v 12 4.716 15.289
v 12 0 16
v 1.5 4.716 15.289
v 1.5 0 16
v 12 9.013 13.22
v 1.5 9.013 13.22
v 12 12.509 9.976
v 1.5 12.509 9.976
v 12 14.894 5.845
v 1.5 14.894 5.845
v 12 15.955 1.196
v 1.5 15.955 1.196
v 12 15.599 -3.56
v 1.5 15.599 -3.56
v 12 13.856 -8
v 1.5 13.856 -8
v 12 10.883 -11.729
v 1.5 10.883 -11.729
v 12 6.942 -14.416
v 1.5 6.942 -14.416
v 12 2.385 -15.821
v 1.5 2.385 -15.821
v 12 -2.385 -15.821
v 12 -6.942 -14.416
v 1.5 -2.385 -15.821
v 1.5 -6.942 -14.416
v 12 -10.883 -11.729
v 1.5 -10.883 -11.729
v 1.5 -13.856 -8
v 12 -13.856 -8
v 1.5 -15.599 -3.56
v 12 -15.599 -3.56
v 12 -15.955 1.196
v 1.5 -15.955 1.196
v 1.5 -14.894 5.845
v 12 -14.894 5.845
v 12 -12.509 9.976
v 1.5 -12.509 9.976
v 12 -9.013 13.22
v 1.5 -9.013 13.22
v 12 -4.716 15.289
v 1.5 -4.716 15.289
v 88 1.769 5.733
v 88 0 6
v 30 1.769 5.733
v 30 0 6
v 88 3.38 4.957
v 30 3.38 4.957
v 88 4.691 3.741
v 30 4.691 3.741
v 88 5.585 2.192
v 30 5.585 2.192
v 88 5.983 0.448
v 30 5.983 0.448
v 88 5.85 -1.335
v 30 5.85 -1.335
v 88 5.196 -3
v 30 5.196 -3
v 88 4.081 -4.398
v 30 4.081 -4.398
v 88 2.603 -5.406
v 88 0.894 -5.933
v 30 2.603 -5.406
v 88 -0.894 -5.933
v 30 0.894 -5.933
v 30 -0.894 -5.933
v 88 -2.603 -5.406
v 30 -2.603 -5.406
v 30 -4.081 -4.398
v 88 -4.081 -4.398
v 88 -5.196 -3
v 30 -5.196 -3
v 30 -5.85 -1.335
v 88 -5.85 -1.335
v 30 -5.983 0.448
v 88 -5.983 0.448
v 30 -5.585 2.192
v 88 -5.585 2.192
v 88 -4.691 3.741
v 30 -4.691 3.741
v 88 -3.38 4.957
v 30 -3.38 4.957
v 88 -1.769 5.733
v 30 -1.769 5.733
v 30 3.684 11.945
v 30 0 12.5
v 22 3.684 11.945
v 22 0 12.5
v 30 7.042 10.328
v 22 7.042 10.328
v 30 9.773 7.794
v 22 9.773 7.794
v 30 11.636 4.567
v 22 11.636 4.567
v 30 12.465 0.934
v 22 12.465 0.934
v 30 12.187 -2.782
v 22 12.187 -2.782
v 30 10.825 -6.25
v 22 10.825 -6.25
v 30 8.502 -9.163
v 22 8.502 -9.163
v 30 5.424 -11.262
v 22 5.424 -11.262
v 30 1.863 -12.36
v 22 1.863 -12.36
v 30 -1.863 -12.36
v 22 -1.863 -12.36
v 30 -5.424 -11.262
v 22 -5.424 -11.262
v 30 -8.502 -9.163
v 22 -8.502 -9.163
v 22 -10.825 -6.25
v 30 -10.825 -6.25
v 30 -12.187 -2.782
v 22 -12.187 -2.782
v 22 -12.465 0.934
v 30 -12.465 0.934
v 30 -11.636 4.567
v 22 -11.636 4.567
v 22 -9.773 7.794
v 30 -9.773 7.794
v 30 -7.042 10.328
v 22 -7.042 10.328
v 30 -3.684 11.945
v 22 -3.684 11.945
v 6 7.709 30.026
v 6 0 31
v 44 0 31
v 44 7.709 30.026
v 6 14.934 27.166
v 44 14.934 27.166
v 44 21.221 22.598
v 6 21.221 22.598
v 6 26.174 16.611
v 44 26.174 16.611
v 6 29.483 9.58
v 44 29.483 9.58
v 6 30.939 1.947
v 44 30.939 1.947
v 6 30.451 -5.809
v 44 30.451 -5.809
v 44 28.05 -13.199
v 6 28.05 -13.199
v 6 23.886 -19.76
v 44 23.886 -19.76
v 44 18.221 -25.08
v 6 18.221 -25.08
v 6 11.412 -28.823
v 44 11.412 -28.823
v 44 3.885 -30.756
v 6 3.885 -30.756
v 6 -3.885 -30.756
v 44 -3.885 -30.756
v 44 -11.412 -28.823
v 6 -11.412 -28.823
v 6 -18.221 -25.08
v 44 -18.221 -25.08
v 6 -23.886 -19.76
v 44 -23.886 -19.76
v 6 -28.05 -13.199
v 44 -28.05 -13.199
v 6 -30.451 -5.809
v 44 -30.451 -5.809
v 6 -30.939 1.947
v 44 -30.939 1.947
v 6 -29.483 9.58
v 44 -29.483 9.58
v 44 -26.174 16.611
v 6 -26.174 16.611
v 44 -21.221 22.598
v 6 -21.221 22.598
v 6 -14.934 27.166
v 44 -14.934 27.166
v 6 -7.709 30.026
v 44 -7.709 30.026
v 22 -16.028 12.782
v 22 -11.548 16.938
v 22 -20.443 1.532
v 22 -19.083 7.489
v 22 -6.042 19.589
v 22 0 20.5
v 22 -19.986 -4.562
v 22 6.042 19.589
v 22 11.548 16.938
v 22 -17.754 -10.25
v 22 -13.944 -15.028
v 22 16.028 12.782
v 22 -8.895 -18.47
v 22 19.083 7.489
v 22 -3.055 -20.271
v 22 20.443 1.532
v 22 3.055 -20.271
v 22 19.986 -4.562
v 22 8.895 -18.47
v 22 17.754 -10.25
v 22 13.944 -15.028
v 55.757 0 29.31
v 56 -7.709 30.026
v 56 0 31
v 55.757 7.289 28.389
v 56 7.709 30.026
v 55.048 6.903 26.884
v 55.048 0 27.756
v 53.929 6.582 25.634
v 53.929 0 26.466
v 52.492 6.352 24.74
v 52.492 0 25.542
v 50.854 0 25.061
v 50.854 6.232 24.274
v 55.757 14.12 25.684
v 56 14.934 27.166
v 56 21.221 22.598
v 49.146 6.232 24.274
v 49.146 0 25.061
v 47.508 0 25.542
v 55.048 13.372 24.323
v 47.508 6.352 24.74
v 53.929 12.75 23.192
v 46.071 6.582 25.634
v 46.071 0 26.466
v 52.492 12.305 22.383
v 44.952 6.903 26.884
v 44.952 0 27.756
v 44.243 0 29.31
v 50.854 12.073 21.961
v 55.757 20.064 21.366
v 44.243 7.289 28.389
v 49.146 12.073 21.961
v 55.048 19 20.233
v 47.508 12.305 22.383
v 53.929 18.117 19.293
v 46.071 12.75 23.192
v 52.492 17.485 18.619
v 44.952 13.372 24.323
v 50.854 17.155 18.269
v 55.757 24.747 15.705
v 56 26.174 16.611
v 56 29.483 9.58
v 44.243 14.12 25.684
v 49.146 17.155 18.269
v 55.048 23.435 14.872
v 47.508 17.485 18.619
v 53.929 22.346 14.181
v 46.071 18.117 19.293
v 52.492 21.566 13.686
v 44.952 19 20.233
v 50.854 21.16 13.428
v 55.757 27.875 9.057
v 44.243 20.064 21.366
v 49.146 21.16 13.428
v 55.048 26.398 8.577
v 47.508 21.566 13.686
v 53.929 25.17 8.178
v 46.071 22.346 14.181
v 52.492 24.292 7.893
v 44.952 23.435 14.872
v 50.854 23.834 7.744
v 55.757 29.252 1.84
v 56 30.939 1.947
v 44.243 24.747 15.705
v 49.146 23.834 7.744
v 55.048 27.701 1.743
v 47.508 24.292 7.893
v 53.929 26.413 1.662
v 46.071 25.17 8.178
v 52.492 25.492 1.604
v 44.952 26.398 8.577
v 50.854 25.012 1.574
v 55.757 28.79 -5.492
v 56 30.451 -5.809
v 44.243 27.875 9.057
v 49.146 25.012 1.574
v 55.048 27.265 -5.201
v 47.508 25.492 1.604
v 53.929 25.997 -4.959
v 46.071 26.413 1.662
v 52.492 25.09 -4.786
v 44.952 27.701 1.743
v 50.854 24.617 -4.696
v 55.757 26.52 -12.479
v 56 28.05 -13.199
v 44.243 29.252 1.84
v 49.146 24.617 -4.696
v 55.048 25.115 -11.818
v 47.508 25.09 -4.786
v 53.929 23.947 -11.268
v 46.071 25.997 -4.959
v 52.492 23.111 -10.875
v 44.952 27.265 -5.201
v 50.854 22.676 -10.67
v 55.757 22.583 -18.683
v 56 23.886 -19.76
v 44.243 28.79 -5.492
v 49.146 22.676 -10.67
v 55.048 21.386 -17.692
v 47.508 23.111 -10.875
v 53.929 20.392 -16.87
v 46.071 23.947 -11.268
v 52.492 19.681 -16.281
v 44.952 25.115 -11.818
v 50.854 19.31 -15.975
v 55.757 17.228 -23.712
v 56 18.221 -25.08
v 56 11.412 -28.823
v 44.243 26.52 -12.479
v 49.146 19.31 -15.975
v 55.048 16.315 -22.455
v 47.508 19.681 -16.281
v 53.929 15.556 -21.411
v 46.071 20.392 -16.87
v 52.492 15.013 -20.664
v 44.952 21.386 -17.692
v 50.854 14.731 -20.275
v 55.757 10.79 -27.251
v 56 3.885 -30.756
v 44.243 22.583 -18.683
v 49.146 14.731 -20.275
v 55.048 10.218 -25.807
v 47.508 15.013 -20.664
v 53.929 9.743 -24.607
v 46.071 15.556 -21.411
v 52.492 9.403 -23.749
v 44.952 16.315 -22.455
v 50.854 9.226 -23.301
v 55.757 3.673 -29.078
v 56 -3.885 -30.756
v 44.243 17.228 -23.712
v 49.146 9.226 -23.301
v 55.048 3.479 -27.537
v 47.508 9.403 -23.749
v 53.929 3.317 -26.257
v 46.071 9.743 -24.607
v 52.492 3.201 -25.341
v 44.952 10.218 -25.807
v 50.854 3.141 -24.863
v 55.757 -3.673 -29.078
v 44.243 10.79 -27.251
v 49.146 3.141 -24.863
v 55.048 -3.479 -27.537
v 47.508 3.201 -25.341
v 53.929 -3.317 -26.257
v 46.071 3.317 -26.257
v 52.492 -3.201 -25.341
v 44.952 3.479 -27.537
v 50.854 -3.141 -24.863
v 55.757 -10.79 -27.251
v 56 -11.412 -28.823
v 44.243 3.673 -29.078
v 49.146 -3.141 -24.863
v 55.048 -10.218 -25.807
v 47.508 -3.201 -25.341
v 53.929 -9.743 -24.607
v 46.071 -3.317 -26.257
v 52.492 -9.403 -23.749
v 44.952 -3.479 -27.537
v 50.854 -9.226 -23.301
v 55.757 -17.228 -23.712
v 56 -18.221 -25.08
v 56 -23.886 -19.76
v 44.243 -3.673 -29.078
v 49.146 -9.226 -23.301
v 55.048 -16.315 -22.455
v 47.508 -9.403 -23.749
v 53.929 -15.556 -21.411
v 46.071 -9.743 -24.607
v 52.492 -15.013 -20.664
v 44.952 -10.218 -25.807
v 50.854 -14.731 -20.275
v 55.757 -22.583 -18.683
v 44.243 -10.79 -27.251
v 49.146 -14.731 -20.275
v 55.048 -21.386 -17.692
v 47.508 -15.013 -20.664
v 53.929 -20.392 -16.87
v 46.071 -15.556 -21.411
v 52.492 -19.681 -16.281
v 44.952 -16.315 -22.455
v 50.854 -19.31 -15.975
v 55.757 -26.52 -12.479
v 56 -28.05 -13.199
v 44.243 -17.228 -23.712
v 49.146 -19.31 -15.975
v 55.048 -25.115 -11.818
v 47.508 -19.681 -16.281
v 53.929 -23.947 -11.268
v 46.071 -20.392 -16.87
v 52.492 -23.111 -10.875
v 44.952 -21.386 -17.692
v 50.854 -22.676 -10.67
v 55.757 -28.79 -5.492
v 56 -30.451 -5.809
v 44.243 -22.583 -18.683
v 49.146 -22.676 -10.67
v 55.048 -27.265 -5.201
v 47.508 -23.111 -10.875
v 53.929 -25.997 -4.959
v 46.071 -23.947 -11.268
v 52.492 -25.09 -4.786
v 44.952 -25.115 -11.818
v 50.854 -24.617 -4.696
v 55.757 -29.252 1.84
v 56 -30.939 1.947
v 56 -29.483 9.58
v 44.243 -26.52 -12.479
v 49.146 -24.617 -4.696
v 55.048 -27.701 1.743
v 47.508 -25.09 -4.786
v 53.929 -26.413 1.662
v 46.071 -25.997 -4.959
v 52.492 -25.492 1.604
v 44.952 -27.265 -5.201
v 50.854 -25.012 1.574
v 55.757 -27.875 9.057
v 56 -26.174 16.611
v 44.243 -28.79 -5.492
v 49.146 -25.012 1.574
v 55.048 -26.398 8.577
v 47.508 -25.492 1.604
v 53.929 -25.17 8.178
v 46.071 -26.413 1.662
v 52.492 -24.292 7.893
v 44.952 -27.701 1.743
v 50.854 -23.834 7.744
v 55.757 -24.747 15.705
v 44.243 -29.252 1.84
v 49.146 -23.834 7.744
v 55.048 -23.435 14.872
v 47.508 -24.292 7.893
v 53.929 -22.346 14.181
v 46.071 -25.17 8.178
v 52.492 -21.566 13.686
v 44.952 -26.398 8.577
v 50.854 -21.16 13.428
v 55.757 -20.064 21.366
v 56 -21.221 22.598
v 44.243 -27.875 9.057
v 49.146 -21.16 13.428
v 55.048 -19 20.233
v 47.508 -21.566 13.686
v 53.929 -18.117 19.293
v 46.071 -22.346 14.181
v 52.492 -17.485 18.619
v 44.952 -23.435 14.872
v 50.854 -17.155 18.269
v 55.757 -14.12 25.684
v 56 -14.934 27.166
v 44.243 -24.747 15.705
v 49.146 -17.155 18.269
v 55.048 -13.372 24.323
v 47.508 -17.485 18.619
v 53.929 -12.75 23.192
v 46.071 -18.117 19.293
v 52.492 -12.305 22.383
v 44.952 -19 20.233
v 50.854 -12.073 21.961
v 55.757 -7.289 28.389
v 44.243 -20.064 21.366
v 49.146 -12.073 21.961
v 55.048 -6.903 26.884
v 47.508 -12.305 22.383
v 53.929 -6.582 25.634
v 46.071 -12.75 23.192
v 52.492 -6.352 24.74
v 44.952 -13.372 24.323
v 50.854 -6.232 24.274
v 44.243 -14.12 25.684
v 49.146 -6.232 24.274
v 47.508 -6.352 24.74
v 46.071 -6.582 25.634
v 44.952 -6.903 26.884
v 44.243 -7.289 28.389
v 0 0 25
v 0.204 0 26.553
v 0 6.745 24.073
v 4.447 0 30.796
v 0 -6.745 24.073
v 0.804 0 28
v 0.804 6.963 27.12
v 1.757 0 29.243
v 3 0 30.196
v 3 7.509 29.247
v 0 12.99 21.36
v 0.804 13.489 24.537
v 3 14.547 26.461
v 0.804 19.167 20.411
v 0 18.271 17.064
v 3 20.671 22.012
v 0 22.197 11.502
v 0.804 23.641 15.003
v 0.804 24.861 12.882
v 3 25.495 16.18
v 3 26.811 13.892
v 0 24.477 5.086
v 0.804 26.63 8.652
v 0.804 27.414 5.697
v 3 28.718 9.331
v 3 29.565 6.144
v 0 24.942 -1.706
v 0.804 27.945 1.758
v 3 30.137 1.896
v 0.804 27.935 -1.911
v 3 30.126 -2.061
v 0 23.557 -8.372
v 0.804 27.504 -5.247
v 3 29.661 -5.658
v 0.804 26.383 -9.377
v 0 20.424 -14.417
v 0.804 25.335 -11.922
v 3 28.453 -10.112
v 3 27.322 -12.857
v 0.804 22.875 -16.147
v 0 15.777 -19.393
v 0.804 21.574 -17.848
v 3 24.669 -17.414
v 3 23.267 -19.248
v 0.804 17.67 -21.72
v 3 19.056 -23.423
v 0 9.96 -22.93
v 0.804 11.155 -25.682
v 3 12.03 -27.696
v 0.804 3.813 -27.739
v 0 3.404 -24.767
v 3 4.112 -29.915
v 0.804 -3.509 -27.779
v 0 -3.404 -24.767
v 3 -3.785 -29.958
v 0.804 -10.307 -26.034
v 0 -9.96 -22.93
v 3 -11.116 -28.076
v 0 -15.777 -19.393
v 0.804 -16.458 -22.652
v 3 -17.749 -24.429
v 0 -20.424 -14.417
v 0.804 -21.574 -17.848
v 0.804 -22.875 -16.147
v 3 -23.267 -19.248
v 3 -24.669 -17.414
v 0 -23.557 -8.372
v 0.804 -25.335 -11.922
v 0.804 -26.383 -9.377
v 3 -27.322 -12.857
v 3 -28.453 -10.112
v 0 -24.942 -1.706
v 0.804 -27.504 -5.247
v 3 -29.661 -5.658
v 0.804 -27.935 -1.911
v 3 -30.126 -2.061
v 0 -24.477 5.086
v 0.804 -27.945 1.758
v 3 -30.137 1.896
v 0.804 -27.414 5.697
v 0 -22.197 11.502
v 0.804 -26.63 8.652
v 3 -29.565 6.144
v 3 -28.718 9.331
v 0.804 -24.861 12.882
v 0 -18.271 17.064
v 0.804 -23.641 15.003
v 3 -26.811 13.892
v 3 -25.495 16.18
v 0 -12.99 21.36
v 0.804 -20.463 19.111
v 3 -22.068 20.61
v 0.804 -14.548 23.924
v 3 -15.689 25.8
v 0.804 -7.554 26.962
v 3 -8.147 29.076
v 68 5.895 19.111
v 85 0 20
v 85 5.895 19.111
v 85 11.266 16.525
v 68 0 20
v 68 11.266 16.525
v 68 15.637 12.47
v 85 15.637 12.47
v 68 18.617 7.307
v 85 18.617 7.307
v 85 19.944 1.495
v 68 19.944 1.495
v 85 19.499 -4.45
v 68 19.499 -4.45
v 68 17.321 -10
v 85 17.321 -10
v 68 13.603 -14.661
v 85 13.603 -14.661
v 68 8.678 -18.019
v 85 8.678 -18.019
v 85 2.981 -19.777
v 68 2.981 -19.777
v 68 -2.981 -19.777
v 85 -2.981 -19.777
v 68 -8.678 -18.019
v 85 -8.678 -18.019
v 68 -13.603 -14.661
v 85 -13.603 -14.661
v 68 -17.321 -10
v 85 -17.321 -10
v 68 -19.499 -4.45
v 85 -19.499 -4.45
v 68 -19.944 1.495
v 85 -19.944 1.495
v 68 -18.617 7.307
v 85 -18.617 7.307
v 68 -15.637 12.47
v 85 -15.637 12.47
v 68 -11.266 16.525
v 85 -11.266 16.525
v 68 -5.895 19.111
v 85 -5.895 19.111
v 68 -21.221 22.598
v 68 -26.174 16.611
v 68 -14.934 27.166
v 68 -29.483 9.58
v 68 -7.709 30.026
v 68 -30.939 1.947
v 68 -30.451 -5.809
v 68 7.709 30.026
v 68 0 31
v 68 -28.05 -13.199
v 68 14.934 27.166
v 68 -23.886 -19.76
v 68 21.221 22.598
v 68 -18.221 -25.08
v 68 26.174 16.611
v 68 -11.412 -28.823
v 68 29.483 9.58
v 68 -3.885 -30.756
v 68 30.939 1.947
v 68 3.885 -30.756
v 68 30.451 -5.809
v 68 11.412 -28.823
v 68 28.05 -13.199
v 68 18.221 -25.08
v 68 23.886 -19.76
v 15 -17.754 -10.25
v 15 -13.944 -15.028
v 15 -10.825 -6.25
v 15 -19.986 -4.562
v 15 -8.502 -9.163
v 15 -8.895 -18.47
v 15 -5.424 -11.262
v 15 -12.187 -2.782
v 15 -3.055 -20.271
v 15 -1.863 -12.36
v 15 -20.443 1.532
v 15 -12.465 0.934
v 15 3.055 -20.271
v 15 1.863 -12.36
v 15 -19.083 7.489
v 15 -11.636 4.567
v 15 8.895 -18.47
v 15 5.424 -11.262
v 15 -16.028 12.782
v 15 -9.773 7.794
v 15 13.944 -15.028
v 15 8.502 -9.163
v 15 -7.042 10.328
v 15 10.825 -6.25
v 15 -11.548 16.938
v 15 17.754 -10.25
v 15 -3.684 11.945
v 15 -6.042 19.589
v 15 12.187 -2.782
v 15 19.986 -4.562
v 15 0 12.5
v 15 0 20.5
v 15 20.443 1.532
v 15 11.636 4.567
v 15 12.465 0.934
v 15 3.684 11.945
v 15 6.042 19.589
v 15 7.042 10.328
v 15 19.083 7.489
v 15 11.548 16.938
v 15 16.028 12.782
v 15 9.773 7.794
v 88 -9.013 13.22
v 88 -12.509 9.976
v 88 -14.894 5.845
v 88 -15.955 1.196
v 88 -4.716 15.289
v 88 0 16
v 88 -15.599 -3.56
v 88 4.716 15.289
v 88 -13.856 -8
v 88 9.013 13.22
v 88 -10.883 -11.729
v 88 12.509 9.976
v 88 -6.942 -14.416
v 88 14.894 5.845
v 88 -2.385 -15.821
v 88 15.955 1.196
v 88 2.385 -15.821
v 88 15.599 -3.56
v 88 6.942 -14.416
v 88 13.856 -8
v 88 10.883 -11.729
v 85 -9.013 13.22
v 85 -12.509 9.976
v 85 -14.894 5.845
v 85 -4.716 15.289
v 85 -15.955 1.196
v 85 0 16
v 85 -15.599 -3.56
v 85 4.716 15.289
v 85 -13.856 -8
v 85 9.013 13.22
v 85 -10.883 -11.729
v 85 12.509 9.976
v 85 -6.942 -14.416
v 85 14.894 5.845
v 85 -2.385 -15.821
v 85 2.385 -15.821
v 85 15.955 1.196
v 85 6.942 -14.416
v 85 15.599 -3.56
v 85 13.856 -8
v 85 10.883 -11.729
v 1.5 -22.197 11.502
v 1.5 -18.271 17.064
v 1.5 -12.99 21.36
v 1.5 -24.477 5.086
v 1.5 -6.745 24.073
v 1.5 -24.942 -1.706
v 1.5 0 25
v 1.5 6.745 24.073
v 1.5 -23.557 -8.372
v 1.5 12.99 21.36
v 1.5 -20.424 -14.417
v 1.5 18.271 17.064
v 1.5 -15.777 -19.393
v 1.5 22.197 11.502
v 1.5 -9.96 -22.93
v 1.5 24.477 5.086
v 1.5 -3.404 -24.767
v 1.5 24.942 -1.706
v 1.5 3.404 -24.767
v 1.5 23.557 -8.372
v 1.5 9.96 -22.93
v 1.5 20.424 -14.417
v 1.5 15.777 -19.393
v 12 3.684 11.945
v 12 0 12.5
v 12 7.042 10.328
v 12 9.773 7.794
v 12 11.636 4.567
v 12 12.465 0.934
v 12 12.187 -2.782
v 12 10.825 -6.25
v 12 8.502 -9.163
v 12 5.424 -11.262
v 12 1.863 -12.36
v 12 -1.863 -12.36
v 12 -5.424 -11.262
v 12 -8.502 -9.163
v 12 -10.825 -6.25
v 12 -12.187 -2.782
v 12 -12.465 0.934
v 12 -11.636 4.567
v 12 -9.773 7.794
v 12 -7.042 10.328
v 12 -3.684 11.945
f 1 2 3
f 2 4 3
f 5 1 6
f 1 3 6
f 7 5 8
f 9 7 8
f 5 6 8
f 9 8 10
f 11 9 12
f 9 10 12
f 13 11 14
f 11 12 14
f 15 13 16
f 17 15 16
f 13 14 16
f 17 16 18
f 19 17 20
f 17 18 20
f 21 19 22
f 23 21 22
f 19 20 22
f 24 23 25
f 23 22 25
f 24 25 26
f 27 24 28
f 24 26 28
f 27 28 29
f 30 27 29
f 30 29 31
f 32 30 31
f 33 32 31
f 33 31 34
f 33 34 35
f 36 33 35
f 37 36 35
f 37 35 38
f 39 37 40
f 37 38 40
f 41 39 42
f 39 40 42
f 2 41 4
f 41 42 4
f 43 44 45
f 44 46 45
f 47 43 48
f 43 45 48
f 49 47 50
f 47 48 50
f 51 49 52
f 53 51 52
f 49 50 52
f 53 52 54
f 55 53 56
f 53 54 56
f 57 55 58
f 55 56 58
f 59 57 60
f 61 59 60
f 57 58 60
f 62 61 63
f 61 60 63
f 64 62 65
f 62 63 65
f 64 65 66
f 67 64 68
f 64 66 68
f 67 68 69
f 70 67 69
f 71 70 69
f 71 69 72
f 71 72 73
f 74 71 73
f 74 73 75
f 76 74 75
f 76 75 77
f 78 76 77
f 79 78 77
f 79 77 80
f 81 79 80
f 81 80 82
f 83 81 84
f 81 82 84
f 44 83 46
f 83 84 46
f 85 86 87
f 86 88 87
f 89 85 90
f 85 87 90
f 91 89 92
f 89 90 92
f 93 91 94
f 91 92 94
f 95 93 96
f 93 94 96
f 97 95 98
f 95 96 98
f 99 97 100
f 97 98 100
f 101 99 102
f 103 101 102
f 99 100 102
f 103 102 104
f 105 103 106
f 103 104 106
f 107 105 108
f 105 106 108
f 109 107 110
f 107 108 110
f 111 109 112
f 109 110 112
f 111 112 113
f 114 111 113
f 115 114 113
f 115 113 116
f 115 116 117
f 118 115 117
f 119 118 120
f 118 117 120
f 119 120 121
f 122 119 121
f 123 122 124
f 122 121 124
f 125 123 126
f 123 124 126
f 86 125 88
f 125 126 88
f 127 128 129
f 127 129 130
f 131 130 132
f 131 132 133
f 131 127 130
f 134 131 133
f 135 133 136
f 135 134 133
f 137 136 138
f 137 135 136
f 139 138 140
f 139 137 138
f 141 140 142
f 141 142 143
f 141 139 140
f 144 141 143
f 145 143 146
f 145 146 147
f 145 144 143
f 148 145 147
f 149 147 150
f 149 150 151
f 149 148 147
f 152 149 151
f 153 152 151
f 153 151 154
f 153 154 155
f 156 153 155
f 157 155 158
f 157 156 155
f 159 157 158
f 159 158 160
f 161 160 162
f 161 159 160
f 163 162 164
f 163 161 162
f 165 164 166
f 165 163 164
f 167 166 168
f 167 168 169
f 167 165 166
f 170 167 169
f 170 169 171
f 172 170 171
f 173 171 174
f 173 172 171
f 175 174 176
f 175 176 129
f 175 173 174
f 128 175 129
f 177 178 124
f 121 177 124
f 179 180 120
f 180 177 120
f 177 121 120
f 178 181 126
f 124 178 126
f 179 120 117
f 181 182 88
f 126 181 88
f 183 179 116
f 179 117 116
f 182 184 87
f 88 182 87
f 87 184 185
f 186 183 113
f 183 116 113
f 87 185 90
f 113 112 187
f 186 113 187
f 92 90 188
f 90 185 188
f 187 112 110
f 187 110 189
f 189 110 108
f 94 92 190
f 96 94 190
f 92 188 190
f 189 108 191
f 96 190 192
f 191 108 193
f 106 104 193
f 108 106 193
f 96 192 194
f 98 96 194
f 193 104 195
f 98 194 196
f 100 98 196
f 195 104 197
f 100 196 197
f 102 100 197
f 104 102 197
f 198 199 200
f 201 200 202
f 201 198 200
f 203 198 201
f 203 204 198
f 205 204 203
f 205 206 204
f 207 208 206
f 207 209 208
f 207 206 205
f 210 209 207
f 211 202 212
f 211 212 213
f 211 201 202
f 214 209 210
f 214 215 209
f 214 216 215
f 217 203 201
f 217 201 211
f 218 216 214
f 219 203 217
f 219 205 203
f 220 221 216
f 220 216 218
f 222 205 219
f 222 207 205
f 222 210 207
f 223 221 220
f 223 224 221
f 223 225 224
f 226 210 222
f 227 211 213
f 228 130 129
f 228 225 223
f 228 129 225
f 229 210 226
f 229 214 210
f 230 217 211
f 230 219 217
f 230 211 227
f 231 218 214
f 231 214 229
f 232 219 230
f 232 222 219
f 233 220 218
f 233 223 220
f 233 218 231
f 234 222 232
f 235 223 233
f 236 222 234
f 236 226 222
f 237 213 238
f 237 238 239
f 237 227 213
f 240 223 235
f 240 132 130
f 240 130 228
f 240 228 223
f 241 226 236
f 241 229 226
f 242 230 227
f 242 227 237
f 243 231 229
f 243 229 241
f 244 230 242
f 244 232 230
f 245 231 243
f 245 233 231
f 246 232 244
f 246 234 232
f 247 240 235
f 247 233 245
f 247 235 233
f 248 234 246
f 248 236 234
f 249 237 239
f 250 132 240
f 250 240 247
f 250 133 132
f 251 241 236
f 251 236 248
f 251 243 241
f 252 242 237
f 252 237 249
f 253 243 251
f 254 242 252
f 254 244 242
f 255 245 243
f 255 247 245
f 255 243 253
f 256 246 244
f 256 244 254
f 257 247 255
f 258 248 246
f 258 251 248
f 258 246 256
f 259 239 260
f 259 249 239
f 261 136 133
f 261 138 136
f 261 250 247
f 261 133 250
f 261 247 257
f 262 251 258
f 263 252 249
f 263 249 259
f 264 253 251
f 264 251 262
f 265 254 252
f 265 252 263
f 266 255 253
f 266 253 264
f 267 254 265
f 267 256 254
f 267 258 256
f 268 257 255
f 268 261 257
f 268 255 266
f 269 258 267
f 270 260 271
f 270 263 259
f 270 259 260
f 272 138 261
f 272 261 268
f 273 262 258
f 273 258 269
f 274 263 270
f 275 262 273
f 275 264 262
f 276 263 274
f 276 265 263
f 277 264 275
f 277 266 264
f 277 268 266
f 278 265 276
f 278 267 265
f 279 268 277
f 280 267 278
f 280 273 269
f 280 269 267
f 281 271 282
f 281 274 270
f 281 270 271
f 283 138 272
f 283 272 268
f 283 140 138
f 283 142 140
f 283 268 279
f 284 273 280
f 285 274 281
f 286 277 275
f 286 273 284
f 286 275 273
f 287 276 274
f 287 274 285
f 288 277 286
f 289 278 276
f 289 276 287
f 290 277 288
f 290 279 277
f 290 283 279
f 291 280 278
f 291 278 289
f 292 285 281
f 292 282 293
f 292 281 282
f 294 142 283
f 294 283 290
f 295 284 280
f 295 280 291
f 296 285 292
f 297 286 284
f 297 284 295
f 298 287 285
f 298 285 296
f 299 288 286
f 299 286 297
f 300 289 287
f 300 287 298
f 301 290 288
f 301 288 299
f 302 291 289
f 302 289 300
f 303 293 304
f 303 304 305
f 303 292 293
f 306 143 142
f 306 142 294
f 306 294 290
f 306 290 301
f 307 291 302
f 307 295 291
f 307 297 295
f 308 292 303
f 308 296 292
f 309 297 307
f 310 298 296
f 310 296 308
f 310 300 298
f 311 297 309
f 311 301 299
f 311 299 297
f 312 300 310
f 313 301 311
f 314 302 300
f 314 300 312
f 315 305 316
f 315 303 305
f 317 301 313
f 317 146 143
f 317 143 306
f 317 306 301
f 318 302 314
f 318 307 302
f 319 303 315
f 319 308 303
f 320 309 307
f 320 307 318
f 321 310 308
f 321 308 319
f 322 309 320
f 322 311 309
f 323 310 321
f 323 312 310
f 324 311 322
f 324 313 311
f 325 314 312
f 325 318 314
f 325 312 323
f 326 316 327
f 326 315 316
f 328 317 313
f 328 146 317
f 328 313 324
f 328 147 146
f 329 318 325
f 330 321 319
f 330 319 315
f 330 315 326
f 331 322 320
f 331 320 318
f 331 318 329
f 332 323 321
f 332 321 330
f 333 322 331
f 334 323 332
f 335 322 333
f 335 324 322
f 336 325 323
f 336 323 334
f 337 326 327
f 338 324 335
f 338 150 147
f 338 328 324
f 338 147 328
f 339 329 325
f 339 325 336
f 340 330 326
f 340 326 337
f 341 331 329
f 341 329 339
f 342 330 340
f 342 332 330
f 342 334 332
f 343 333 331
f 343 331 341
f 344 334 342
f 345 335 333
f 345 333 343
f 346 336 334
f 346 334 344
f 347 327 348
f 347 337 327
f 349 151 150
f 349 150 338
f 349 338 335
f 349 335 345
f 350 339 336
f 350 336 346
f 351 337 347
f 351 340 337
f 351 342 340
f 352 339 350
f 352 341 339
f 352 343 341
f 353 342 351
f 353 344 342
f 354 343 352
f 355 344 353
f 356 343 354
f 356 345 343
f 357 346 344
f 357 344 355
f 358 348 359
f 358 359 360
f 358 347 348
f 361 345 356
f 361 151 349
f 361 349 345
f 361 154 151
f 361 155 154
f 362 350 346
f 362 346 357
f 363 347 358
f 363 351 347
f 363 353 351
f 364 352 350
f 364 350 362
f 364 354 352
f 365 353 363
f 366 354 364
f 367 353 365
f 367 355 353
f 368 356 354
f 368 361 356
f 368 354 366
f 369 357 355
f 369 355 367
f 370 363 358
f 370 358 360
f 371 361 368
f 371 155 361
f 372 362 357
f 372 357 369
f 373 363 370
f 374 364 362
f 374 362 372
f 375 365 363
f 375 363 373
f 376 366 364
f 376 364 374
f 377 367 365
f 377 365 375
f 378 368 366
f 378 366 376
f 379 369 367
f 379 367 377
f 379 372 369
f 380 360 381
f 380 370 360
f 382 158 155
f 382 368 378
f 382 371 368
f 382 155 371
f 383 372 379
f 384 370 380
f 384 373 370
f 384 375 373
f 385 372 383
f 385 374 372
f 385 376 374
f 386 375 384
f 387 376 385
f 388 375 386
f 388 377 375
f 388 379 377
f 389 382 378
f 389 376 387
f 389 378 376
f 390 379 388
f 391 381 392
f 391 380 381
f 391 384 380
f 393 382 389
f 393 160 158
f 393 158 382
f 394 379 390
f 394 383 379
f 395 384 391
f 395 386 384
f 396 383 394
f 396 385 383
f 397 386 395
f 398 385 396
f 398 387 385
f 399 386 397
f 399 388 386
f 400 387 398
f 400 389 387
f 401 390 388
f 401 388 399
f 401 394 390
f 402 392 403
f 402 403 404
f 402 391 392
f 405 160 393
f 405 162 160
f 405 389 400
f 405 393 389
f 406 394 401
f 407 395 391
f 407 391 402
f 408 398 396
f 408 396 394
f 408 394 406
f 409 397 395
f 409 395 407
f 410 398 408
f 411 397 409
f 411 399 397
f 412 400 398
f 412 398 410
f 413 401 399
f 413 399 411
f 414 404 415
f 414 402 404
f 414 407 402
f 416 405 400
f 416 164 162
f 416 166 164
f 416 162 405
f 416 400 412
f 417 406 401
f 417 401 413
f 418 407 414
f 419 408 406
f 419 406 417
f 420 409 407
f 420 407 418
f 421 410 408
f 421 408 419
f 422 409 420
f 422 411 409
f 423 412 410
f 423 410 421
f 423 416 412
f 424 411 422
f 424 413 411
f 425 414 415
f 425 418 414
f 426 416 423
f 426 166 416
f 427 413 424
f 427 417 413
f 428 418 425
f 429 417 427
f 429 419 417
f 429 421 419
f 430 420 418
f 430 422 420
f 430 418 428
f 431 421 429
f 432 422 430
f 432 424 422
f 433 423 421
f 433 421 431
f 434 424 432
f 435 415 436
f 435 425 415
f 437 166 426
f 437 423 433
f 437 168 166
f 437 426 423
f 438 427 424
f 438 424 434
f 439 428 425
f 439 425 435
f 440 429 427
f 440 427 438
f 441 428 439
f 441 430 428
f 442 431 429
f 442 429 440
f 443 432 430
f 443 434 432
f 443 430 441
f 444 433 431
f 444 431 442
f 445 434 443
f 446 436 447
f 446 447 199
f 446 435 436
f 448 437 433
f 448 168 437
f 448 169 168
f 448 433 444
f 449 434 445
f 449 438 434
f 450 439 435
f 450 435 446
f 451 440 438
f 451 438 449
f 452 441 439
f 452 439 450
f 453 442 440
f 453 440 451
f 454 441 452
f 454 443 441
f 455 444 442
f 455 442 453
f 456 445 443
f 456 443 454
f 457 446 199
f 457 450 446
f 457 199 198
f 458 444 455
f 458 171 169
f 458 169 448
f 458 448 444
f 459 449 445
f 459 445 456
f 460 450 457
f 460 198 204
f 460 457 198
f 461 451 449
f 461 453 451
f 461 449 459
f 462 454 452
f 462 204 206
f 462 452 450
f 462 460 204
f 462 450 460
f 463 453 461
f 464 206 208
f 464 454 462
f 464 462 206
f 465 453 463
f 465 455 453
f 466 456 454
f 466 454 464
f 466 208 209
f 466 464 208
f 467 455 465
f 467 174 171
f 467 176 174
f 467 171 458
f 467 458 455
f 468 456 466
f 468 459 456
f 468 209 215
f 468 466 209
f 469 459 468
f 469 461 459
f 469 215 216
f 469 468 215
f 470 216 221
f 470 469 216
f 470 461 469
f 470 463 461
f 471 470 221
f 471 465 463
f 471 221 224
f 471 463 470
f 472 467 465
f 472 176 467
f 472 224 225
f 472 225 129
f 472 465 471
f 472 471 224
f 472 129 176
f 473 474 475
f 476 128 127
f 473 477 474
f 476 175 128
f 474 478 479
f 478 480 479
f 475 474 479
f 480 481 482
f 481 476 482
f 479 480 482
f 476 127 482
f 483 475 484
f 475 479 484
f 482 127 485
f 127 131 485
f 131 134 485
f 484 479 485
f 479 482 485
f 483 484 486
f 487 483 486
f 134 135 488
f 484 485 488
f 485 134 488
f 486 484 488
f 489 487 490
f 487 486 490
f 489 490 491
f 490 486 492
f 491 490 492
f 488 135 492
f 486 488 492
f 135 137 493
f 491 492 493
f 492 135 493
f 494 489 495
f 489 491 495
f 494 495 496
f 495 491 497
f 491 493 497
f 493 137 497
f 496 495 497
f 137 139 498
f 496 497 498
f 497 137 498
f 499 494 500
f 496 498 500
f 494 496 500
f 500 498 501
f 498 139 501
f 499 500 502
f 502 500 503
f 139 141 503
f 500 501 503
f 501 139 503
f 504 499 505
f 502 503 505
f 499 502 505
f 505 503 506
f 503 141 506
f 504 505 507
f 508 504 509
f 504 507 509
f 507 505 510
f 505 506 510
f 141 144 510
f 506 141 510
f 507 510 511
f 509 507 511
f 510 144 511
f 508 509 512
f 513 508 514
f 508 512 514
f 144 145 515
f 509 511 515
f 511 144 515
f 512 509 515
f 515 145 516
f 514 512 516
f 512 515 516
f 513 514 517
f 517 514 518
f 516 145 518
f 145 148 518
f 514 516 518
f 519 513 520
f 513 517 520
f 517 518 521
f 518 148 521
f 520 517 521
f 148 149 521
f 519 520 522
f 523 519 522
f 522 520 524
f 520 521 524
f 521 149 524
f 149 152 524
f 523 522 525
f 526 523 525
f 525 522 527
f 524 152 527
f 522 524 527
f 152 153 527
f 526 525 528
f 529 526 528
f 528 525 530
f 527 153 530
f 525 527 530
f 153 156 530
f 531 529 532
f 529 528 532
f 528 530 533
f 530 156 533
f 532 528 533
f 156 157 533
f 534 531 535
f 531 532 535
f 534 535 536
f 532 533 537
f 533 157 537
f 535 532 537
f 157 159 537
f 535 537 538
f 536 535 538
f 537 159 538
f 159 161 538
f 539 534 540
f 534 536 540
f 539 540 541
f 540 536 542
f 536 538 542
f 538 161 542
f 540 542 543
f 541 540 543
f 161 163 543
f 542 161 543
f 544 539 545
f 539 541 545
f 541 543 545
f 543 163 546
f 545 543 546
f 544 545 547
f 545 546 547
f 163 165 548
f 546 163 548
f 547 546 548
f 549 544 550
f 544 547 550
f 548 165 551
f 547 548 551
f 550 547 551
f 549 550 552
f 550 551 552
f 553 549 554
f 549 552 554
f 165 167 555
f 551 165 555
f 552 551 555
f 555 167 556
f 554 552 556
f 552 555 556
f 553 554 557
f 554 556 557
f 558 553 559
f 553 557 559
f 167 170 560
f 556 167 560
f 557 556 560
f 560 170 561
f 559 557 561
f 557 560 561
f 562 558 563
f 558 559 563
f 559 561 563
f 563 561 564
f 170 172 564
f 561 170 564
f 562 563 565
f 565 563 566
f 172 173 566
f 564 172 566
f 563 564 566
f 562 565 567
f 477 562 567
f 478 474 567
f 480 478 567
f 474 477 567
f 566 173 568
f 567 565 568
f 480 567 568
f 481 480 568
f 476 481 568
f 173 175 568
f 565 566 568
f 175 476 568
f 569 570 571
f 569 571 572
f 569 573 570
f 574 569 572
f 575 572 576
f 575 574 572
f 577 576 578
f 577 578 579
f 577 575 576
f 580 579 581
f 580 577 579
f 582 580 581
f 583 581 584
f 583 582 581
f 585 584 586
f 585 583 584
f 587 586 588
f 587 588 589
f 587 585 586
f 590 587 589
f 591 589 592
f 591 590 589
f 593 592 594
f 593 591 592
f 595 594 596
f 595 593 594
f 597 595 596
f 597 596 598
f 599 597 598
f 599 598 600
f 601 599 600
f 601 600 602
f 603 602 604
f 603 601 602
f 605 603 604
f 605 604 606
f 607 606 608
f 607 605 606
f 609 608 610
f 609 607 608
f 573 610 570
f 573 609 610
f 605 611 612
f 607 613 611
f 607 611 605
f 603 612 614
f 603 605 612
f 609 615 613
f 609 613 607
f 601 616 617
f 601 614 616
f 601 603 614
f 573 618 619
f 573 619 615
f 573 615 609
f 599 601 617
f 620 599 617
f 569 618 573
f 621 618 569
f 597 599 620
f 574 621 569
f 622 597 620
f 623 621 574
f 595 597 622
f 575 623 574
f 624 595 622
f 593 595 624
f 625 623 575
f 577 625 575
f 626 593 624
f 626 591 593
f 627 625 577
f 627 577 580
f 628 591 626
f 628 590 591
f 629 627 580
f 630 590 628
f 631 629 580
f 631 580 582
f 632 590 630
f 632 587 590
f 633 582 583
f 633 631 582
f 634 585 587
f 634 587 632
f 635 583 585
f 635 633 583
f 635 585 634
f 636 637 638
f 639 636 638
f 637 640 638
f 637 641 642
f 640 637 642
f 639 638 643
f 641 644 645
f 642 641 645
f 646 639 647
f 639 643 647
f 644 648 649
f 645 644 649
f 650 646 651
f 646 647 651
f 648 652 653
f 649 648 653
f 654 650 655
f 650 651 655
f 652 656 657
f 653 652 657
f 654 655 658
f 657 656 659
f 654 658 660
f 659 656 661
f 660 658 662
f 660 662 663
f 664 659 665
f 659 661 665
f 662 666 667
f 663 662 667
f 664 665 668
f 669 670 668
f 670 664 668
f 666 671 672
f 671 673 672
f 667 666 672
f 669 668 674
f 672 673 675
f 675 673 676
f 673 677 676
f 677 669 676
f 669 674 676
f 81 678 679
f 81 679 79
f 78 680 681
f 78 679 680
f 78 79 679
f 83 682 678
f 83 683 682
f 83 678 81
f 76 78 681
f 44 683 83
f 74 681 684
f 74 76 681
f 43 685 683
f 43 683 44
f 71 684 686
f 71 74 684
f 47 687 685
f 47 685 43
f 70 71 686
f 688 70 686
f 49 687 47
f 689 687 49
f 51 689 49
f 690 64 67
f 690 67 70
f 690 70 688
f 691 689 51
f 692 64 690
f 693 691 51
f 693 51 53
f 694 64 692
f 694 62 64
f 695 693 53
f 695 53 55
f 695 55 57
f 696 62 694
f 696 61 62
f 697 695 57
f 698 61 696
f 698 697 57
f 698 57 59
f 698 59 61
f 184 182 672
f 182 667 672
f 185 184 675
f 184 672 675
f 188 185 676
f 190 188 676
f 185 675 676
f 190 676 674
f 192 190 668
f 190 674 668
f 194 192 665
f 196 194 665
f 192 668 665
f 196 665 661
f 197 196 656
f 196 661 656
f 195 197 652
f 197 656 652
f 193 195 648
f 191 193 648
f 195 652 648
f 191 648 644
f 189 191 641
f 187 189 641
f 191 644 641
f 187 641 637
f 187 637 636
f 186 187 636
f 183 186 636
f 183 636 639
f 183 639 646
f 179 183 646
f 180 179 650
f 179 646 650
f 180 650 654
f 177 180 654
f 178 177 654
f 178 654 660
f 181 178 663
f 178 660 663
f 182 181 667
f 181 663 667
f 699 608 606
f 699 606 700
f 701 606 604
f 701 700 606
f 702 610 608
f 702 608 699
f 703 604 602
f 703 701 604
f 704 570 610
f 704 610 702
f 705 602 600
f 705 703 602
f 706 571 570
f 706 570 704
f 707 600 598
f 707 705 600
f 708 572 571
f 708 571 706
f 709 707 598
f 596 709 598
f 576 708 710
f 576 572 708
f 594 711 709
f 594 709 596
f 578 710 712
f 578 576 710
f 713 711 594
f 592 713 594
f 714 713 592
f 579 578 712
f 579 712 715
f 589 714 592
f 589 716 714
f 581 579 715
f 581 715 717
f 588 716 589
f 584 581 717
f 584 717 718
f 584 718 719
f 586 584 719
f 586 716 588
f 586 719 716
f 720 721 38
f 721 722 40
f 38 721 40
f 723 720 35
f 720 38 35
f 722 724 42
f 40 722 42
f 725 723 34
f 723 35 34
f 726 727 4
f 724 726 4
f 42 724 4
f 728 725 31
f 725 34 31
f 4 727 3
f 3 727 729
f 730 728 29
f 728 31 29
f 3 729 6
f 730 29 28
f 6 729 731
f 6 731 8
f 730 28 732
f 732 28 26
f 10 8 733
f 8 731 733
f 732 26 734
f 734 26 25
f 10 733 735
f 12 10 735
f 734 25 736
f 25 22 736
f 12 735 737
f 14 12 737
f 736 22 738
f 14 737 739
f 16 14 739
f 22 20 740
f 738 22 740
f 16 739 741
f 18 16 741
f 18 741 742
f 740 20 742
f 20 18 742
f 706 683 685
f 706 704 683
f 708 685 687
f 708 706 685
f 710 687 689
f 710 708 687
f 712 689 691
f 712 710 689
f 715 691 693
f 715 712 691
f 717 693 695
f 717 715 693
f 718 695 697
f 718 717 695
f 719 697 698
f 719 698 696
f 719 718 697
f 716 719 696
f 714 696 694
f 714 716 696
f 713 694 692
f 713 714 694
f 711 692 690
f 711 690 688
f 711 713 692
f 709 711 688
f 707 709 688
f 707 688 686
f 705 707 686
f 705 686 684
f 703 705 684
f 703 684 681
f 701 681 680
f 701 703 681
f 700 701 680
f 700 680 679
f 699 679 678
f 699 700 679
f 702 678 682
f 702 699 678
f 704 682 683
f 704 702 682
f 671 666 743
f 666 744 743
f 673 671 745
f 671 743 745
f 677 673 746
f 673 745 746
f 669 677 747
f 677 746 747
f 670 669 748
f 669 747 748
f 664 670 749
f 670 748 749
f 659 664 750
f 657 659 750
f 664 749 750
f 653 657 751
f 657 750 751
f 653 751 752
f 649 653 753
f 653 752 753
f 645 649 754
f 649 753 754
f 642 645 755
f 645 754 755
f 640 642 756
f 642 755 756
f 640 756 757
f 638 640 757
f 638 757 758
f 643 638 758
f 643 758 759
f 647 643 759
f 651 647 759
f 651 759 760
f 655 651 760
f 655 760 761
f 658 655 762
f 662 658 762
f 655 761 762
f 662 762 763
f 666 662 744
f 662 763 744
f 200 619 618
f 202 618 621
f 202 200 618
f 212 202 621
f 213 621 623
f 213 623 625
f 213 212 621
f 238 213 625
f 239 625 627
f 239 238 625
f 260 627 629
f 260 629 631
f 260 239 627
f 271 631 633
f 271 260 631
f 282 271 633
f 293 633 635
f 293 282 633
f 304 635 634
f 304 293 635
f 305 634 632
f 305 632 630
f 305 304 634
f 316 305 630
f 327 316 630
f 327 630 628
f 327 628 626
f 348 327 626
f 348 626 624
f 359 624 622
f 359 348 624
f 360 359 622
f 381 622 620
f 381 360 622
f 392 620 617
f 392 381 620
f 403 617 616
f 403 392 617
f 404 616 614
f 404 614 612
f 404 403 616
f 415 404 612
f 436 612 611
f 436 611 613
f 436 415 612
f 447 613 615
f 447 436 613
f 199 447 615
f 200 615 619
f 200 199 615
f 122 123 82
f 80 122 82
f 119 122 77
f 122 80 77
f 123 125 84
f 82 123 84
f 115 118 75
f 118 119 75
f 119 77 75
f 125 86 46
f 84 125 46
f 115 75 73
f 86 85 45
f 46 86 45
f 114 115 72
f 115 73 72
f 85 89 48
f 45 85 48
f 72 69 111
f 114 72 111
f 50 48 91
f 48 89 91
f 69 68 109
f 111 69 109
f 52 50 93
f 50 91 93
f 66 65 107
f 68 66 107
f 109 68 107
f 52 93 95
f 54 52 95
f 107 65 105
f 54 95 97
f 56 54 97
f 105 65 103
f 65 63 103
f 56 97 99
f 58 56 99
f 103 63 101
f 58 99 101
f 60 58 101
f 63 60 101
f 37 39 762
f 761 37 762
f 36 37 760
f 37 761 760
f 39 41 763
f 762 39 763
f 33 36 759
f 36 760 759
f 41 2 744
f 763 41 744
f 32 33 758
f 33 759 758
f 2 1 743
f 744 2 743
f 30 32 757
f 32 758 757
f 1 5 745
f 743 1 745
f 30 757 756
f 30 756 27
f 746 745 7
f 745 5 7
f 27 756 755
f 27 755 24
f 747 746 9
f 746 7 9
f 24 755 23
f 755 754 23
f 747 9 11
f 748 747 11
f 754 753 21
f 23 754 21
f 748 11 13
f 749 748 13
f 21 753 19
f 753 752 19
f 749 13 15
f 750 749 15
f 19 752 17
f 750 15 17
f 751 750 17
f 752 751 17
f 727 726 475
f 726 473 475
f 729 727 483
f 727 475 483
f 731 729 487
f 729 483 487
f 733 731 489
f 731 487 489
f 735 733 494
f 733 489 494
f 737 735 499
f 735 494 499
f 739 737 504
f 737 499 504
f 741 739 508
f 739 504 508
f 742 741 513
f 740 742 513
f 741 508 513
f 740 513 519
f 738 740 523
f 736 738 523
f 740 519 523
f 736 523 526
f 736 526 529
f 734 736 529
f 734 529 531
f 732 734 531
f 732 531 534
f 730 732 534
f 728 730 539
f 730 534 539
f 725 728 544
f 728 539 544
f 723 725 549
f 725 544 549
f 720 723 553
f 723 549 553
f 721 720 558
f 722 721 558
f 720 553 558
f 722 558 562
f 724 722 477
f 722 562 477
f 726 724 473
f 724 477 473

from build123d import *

# Parameters (mm, degrees)
F4_R = 5.99999


# Not quite as in the source:
# - a fillet or chamfer is up to 0.001 mm smaller than in the source, because OpenCascade refuses the exact size


with BuildPart() as f1:
    # F0 (on Front) → F1 (revolve)
    with BuildSketch(Plane.XZ):
        with BuildLine():
            Line((0, 31), (0, 0))
            Line((0, 0), (88, 0))
            Line((88, 0), (88, 16))
            Line((88, 16), (85, 16))
            Line((85, 16), (85, 20))
            Line((85, 20), (68, 20))
            Line((68, 20), (68, 31))
            Line((68, 31), (56, 31))
            ThreePointArc((56, 31), (50, 25), (44, 31))
            Line((44, 31), (0, 31))
        make_face()
    revolve(axis=Axis((-6.5542864613, 0, 0), (-1, 0, 0)))

    # F2 (on Front) → F3 (revolve, cut)
    with BuildSketch(Plane.XZ):
        Polygon((0, 25), (0, 0), (88, 0), (88, 6), (30, 6), (30, 12.5), (22, 12.5), (22, 20.5), (15, 20.5), (15, 12.5), (12, 12.5), (12, 16), (1.5, 16), (1.5, 25), align=None)
    revolve(axis=Axis((44, 0, 0), (-1, 0, 0)), mode=Mode.SUBTRACT)

    # F4 (radius 6 in the source; OpenCascade refuses exactly that, so slightly less here)
    f4_edges = [f1.edges().sort_by_distance(p)[0] for p in [
        (0, 0, -31),
    ]]
    fillet(f4_edges, radius=F4_R)


solid = f1.part
